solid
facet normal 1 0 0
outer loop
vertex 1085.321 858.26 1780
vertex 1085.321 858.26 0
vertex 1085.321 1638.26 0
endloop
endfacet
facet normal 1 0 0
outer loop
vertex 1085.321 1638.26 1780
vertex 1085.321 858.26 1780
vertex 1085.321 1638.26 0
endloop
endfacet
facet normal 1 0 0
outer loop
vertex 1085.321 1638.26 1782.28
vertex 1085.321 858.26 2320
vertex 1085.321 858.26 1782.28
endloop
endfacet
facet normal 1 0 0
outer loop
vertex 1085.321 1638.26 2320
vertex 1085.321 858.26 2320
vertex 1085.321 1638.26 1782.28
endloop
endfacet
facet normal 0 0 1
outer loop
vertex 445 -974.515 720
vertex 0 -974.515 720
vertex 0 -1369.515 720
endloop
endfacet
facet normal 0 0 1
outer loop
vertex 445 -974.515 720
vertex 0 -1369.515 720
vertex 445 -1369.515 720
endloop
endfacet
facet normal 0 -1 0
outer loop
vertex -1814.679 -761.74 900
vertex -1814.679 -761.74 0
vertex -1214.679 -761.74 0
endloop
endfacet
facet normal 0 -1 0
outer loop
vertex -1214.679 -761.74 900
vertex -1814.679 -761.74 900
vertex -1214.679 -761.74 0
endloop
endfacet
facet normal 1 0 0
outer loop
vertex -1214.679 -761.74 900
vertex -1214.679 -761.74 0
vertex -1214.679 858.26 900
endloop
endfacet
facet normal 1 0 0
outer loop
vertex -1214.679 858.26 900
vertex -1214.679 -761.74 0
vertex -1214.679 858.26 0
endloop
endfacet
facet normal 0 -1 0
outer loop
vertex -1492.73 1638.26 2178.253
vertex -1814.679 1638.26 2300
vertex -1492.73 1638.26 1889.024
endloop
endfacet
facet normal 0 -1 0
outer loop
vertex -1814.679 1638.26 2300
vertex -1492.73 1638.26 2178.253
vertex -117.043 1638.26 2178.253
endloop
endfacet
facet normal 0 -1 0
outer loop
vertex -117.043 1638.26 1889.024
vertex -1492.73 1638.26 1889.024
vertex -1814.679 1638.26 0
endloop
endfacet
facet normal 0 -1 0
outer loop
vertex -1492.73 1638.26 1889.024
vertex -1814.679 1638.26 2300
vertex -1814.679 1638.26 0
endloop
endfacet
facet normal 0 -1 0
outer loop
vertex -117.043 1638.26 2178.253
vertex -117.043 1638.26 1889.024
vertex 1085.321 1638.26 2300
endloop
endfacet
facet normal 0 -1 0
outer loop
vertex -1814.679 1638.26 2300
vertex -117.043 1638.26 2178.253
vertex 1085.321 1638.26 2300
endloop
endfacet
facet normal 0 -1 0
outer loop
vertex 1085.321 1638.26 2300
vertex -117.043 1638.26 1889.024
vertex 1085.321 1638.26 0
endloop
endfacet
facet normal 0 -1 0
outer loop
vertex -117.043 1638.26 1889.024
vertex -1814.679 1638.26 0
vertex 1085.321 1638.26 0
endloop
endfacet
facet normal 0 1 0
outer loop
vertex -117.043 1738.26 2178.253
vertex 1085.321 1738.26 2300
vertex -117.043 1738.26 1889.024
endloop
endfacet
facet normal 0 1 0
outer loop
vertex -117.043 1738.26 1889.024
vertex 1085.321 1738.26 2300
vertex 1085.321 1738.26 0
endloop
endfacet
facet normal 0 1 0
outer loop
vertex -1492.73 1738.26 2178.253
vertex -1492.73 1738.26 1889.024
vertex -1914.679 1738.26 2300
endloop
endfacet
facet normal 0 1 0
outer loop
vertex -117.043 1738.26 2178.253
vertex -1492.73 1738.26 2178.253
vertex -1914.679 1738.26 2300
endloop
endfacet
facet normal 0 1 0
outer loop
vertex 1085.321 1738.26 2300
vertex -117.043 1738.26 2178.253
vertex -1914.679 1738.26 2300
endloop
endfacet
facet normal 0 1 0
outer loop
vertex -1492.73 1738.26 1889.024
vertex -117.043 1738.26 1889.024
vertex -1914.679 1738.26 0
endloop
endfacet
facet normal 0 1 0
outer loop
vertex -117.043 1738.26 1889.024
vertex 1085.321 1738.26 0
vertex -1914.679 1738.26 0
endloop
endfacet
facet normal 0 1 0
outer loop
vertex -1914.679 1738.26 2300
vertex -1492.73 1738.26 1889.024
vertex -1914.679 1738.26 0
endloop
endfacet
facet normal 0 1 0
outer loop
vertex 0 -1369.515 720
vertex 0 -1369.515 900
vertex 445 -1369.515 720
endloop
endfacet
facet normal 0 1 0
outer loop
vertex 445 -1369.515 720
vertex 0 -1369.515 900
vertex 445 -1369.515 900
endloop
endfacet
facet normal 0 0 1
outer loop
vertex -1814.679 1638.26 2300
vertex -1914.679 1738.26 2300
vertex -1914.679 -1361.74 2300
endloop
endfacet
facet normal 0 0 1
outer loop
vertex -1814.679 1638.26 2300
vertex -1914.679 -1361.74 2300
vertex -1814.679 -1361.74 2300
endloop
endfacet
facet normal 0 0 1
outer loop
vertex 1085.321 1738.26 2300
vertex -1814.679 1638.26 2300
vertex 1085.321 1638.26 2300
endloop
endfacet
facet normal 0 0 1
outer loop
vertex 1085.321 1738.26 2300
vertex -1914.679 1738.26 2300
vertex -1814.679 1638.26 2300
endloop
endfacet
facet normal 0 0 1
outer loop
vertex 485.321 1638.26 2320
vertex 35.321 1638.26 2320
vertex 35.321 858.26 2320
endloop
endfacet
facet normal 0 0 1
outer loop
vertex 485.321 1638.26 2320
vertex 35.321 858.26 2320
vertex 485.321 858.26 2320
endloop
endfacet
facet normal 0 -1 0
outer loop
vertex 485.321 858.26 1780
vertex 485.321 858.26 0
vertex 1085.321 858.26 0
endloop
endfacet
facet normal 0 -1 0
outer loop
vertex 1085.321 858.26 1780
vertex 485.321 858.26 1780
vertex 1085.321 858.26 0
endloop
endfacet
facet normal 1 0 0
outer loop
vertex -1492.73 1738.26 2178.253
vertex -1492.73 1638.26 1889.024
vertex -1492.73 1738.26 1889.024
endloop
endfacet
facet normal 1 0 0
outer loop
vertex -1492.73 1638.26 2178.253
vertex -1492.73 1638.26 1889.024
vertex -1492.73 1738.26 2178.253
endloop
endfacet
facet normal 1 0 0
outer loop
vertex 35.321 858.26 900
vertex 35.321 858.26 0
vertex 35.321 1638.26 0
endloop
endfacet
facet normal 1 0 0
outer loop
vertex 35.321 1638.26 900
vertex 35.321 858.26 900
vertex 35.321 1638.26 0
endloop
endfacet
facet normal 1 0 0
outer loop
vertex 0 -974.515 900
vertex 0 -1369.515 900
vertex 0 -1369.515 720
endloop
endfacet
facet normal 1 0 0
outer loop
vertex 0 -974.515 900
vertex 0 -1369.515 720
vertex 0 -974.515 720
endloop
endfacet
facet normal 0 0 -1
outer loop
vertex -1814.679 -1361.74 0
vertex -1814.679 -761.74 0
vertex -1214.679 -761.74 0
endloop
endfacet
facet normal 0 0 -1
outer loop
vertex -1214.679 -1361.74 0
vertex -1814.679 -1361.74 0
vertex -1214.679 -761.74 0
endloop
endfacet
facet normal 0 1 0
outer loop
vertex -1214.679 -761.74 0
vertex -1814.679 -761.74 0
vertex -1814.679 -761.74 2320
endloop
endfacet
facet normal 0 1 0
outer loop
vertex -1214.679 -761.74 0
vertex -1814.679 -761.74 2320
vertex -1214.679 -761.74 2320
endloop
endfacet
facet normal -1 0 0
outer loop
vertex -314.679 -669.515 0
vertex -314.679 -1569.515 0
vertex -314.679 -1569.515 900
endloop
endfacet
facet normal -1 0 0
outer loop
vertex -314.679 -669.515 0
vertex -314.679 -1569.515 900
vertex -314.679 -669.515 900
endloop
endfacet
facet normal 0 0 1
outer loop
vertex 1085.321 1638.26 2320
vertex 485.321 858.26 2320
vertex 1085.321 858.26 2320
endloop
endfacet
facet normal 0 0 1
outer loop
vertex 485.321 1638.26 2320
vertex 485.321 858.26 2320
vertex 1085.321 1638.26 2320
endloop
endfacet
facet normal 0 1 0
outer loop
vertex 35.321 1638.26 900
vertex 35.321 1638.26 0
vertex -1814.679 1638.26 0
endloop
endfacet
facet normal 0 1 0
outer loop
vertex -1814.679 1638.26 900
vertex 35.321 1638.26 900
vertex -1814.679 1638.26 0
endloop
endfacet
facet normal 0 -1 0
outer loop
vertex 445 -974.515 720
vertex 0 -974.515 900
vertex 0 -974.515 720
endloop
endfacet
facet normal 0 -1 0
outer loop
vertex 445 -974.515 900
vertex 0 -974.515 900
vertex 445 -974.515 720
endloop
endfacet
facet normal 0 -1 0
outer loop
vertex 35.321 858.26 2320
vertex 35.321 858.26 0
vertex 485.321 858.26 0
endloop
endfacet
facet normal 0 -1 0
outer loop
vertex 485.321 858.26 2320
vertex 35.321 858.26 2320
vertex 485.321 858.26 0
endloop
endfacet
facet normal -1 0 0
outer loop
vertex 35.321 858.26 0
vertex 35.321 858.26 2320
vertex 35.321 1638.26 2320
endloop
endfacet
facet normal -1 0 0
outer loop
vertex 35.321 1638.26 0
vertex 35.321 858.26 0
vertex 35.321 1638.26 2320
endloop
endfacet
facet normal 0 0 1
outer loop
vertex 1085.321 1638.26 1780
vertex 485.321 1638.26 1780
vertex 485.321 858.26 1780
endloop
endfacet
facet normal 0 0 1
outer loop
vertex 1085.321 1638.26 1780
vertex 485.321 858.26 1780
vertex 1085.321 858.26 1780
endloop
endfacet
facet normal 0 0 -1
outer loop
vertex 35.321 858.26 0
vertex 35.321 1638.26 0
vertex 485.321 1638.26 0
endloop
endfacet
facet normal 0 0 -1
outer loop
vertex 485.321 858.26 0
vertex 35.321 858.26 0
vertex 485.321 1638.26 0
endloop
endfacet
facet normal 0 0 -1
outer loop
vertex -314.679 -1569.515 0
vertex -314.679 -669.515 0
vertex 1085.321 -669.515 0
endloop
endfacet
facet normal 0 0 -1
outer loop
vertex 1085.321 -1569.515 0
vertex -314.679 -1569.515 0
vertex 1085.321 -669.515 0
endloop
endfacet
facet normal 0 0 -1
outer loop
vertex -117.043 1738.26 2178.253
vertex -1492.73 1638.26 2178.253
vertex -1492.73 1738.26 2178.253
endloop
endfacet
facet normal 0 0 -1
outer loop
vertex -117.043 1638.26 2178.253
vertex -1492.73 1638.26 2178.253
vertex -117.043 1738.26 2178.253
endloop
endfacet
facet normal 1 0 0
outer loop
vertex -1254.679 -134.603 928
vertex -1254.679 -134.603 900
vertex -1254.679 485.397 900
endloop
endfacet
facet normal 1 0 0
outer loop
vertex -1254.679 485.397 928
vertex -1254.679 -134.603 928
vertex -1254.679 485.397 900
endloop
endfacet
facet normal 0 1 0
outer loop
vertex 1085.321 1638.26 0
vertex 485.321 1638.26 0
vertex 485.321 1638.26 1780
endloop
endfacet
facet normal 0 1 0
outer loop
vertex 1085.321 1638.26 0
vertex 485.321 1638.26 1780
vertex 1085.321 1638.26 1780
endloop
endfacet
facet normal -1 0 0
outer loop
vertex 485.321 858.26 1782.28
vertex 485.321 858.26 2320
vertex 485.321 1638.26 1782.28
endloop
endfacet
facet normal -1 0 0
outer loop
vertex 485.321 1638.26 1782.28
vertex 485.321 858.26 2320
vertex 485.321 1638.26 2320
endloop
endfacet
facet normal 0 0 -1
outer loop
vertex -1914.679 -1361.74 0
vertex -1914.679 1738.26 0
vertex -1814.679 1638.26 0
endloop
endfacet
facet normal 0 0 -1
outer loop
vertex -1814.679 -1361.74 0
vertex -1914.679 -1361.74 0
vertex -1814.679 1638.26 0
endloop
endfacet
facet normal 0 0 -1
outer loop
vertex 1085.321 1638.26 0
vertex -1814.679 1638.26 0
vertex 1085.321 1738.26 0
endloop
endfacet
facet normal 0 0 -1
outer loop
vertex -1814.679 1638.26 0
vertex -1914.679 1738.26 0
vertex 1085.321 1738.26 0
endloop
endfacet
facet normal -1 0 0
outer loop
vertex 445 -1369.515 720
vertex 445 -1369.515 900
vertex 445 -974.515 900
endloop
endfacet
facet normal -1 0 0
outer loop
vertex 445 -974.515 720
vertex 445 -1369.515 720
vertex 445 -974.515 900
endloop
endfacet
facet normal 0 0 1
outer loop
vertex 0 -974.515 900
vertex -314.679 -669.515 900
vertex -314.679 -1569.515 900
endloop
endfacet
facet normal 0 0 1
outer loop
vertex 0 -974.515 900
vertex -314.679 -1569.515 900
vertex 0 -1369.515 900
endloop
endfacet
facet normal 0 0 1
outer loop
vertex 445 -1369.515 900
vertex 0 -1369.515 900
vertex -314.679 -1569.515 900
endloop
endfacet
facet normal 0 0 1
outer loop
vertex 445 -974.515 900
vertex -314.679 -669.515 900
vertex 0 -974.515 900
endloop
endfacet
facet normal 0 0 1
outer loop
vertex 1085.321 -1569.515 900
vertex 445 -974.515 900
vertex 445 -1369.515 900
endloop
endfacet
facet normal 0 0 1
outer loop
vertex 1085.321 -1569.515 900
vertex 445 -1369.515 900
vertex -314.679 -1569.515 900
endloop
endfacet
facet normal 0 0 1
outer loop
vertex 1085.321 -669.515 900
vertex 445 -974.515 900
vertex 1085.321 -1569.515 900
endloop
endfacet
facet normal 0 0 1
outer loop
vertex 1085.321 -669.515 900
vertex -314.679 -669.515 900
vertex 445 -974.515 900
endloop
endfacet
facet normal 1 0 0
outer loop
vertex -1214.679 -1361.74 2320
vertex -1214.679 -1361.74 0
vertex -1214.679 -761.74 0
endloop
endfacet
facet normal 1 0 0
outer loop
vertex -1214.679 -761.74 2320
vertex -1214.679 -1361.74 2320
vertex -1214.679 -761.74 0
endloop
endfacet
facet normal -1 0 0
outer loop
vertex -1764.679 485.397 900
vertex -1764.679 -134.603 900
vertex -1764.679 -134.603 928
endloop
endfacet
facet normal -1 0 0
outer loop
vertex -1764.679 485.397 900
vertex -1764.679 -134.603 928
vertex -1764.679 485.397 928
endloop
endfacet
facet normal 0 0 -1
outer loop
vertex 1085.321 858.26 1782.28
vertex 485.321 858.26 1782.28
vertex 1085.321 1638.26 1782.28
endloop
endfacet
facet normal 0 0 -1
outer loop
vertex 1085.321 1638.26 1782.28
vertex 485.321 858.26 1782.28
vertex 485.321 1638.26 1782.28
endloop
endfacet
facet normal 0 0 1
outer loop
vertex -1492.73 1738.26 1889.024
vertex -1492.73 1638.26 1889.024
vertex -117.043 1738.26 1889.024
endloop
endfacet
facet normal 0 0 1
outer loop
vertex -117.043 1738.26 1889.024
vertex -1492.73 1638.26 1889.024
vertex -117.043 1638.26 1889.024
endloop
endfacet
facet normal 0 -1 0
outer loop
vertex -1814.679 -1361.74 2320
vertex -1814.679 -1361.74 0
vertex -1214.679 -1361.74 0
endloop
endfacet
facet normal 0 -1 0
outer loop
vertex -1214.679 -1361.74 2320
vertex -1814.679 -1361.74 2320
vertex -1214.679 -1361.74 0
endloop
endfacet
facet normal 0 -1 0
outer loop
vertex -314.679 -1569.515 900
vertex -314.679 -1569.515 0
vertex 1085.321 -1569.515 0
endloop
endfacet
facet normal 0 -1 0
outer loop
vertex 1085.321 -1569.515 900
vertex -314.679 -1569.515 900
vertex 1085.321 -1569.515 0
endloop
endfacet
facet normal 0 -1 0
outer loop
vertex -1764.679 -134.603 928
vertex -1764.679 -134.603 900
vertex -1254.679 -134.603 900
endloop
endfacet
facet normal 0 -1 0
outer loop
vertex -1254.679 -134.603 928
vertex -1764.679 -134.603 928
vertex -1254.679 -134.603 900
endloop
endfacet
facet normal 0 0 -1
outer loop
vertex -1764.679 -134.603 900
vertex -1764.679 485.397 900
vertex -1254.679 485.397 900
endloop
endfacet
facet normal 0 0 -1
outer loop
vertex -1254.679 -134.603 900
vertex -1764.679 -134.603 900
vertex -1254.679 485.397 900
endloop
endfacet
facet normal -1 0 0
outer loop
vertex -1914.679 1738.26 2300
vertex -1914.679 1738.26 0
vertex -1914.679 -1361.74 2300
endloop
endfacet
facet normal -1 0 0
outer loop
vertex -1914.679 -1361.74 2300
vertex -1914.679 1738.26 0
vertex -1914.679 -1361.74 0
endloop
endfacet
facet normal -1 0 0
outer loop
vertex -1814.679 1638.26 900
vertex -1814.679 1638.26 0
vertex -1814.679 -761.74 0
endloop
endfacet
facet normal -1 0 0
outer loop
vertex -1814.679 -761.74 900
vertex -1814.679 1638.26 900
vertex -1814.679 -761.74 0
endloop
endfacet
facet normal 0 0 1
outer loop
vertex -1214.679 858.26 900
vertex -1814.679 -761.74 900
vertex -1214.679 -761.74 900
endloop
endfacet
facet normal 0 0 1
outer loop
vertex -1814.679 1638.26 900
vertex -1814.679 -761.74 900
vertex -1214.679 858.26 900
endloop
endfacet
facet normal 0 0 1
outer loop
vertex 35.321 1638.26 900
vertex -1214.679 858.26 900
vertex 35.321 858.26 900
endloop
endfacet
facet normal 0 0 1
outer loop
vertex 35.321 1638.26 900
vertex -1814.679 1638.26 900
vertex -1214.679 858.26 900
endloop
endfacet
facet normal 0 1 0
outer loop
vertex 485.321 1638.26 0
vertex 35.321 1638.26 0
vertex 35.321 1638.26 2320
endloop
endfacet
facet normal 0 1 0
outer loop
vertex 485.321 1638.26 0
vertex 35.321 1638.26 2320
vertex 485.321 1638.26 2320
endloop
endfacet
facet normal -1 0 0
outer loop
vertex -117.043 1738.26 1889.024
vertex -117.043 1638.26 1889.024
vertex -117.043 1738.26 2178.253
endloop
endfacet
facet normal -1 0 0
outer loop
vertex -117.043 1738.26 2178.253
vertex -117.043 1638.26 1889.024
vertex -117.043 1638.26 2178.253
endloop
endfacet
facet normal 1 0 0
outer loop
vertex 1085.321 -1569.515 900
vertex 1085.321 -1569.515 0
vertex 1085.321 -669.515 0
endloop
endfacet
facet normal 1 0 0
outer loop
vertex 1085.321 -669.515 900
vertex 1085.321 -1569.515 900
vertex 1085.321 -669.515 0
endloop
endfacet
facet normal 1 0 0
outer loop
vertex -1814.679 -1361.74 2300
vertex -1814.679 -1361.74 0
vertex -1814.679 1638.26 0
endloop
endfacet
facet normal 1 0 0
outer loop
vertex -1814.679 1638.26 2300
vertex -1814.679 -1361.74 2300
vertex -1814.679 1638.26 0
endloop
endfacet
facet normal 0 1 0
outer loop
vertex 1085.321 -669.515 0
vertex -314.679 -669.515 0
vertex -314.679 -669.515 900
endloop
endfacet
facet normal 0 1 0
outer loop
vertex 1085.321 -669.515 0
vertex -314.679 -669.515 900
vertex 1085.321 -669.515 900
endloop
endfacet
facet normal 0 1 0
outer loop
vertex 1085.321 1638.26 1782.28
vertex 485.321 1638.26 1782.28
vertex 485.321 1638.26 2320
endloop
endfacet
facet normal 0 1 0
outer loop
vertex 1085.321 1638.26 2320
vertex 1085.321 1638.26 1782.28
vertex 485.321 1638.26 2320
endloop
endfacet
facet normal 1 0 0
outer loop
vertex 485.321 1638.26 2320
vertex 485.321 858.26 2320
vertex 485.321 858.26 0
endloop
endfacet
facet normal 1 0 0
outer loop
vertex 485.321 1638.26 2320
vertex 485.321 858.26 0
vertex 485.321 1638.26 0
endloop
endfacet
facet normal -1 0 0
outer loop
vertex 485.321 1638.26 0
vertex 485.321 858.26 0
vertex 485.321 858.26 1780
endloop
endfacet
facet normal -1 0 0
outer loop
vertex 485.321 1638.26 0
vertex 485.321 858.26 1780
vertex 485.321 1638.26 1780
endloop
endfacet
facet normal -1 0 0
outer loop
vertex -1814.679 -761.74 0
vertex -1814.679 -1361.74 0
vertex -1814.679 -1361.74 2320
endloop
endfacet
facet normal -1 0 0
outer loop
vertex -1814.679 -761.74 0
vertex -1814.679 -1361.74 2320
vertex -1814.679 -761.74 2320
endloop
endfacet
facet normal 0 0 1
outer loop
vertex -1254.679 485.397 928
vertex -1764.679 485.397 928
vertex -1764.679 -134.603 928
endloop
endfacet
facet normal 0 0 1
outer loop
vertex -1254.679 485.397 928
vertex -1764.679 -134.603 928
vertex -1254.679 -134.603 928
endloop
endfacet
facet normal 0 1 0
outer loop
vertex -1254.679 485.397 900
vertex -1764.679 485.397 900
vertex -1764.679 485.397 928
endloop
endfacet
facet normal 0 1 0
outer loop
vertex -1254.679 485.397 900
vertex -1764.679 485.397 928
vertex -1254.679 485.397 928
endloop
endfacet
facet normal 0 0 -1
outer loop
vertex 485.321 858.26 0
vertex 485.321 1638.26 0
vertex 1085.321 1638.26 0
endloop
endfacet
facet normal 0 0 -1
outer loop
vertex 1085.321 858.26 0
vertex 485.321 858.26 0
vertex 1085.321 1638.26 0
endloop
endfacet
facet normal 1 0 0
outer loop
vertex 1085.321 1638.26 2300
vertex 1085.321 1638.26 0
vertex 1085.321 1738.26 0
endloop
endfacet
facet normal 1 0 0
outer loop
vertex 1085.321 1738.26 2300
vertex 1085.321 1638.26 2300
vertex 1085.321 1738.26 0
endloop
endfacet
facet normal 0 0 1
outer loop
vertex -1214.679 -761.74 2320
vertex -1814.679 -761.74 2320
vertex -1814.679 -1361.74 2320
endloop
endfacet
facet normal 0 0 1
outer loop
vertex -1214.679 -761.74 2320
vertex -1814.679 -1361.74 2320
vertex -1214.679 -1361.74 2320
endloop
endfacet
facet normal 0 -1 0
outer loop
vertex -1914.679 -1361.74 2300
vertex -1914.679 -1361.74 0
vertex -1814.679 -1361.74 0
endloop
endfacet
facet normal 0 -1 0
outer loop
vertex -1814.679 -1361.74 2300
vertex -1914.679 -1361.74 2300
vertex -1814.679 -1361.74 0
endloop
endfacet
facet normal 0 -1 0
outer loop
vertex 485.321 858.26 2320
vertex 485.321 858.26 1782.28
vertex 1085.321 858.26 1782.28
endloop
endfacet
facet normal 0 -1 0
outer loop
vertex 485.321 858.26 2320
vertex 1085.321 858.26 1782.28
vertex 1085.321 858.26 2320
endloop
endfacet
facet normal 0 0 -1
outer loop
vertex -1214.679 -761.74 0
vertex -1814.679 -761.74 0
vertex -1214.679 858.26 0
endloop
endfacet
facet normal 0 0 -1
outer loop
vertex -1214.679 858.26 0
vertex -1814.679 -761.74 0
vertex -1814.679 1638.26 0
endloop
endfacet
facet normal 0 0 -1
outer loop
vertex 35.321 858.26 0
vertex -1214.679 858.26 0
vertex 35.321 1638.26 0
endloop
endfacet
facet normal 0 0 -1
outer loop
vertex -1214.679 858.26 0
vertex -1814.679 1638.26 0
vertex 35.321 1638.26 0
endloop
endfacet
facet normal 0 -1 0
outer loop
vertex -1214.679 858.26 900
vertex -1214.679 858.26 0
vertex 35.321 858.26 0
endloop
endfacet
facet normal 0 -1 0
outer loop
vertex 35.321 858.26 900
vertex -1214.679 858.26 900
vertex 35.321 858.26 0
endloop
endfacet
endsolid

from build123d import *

# Parameters (mm, degrees)
F0_W      = 600
F0_H      = 779.999971
F1_DEPTH  = 1780
F0_W_2    = 450
F2_DEPTH  = 2320
F0_H_2    = 600
F3_DEPTH  = 2320
F4_DEPTH  = 900
F0_W_3    = 1400
F0_H_3    = 900
F5_DEPTH  = 900
F6_W      = 779.999971
F6_H      = 537.720032
F7_DEPTH  = 600
F8_DEPTH  = 2300
F9_W      = 510
F9_H      = 620
F10_DEPTH = 28
F11_W     = 1375.687555
F11_H     = 289.229512
F12_DEPTH = 100.001
F13_W     = 445
F13_H     = 395
F14_DEPTH = 180


with BuildPart() as f1:
    # F0 (on Top) → F1 (new body)
    with BuildSketch(Plane.XY):
        with Locations((785.321288, 1248.260403)):
            Rectangle(F0_W, F0_H)
    extrude(amount=F1_DEPTH)


with BuildPart() as f2:
    # F0 (on Top) → F2 (new body)
    with BuildSketch(Plane.XY):
        with Locations((260.321288, 1248.260403)):
            Rectangle(F0_W_2, F0_H)
    extrude(amount=F2_DEPTH)


with BuildPart() as f3:
    # F0 (on Top) → F3 (new body)
    with BuildSketch(Plane.XY):
        with Locations((-1514.678712, -1061.739612)):
            Rectangle(F0_W, F0_H_2)
    extrude(amount=F3_DEPTH)


with BuildPart() as f4:
    # F0 (on Top) → F4 (new body)
    with BuildSketch(Plane.XY):
        Polygon((35.321288, 1638.260388), (-1814.678712, 1638.260388), (-1814.678712, 1038.260388), (-1814.678712, -761.739612), (-1214.678712, -761.739612), (-1214.678712, 858.260417), (35.321288, 858.260417), align=None)
    extrude(amount=F4_DEPTH)


with BuildPart() as f5:
    # F0 (on Top) → F5 (new body)
    with BuildSketch(Plane.XY):
        with Locations((385.321288, -1119.514632)):
            Rectangle(F0_W_3, F0_H_3)
    extrude(amount=F5_DEPTH)

    # F13 (on face) → F14 (cut)
    with BuildSketch(Plane.XY.offset(900)):
        with Locations((222.5, -1172.014632)):
            Rectangle(F13_W, F13_H)
    extrude(amount=-F14_DEPTH, mode=Mode.SUBTRACT)


with BuildPart() as f7:
    # F6 (on face) → F7 (new body)
    with BuildSketch(Plane.YZ.offset(485.321288)):
        with Locations((1248.260403, 2051.139984)):
            Rectangle(F6_W, F6_H)
    extrude(amount=F7_DEPTH)


with BuildPart() as f8:
    # F0 (on Top) → F8 (new body)
    with BuildSketch(Plane.XY):
        Polygon((-1814.678712, 1038.260388), (-1814.678712, 1638.260388), (35.321288, 1638.260388), (485.321288, 1638.260388), (1085.321288, 1638.260388), (1085.321288, 1738.260388), (-1914.678712, 1738.260388), (-1914.678712, 858.260417), (-1914.678712, -1361.739612), (-1814.678712, -1361.739612), (-1814.678712, -761.739612), align=None)
    extrude(amount=F8_DEPTH)

    # F11 (on face) → F12 (cut, through all)
    with BuildSketch(Plane.XZ.offset(-1638.260388)):
        with Locations((-804.886483, 2033.638418)):
            Rectangle(F11_W, F11_H)
    extrude(amount=-F12_DEPTH, mode=Mode.SUBTRACT)


with BuildPart() as f10:
    # F9 (on face) → F10 (new body)
    with BuildSketch(Plane.XY.offset(900)):
        with Locations((-1509.678712, 175.397433)):
            Rectangle(F9_W, F9_H)
    extrude(amount=F10_DEPTH)


solid = Compound([f1.part, f2.part, f3.part, f4.part, f5.part, f7.part, f8.part, f10.part])
